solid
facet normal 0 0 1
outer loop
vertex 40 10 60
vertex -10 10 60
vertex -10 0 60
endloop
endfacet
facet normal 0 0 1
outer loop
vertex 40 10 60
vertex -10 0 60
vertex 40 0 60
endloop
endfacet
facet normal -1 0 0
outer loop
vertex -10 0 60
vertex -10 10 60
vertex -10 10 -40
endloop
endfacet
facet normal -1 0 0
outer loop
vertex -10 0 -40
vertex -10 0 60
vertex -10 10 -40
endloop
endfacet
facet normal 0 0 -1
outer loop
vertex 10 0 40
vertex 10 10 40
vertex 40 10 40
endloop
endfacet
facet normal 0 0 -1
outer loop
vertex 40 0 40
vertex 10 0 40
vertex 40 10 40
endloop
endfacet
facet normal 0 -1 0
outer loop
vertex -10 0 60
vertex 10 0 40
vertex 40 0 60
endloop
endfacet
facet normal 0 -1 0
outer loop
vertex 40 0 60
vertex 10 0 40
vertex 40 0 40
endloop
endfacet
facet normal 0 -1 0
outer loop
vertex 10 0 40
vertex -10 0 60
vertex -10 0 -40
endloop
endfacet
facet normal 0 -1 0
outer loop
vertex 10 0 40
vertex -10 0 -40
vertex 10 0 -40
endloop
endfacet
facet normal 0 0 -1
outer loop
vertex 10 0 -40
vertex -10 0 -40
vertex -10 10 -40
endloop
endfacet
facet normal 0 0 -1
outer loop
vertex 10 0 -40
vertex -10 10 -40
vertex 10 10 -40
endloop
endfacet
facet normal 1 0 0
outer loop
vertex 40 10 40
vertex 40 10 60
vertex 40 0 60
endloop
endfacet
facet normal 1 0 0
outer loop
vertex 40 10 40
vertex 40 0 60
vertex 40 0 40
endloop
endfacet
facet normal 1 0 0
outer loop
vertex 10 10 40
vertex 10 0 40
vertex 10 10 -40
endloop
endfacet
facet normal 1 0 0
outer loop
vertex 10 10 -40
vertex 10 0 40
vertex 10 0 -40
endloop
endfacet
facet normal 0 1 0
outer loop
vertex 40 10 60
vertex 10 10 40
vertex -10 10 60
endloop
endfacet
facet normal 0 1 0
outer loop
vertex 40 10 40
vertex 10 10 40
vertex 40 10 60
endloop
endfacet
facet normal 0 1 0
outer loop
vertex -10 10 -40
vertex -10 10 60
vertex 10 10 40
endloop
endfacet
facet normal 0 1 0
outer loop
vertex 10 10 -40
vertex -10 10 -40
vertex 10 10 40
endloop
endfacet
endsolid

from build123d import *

# Parameters (mm, degrees)
SKETCH1_W           = 20
SKETCH1_H           = 80
BOSS_EXTRUDE1_DEPTH = 10
SKETCH3_W           = 50
SKETCH3_H           = 20
BOSS_EXTRUDE2_DEPTH = 10


with BuildPart() as part:
    # Sketch1 → Boss-Extrude1 (new body)
    with BuildSketch(Plane(origin=(0, 0, 0), x_dir=(1, 0, 0), z_dir=(0, 1, 0))):
        Rectangle(SKETCH1_W, SKETCH1_H)
    extrude(amount=BOSS_EXTRUDE1_DEPTH)

    # Sketch3 → Boss-Extrude2 (add)
    with BuildSketch(Plane(origin=(0, 10, 0), x_dir=(1, 0, 0), z_dir=(0, 1, 0))):
        with Locations((15, -50)):
            Rectangle(SKETCH3_W, SKETCH3_H)
    extrude(amount=-BOSS_EXTRUDE2_DEPTH)


solid = part.part
